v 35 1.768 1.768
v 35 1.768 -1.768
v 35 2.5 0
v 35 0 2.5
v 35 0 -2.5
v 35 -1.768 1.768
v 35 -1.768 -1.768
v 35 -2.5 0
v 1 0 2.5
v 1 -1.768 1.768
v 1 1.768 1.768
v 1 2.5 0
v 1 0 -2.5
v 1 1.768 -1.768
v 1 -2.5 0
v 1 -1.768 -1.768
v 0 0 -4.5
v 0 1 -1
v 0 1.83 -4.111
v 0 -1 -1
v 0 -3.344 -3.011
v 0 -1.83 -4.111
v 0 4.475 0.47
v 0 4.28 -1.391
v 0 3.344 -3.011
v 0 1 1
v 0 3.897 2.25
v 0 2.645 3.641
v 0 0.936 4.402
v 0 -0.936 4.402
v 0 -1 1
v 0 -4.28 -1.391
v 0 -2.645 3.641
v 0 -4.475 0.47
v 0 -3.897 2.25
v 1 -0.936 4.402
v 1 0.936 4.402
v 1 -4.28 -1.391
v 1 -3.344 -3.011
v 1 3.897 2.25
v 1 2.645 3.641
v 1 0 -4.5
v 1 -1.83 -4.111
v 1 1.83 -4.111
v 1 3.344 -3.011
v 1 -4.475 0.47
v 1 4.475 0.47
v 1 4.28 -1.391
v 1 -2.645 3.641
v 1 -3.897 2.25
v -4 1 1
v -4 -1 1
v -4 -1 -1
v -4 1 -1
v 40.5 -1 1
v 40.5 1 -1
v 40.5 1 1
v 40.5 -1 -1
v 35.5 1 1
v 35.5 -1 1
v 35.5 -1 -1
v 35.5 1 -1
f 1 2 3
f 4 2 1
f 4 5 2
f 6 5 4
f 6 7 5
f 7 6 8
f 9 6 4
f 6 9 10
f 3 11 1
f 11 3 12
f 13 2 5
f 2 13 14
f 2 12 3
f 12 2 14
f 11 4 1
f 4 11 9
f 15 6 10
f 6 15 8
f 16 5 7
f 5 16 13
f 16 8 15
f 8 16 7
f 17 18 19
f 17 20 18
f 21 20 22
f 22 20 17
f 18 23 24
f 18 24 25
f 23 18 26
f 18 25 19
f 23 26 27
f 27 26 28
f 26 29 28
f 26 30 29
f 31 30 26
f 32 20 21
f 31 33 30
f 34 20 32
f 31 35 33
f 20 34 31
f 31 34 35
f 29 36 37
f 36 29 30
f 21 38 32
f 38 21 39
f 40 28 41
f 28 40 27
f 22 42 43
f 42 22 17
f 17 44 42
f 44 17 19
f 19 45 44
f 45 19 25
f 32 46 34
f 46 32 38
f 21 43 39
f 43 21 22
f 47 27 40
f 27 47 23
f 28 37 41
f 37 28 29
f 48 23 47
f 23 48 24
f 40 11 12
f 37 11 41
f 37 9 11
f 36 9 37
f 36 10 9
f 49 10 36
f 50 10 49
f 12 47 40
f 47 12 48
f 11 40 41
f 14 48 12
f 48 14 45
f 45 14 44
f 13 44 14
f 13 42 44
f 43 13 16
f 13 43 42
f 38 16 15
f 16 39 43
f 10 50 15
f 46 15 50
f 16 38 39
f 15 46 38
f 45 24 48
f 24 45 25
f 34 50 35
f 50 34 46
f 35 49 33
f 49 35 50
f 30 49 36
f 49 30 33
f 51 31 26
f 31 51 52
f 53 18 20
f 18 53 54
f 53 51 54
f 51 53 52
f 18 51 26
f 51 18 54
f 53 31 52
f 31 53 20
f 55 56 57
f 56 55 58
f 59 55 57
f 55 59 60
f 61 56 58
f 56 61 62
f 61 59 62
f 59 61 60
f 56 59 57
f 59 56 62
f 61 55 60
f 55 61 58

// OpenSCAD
 rotate([0,90,0]) cylinder(35,2.5,2.5);
 rotate([0,90,0]) cylinder(1,4.5,4.5);

 translate([-2,0,0]) cube([4,2,2], center=true);
 translate([38,0,0]) cube([5,2,2], center=true);
